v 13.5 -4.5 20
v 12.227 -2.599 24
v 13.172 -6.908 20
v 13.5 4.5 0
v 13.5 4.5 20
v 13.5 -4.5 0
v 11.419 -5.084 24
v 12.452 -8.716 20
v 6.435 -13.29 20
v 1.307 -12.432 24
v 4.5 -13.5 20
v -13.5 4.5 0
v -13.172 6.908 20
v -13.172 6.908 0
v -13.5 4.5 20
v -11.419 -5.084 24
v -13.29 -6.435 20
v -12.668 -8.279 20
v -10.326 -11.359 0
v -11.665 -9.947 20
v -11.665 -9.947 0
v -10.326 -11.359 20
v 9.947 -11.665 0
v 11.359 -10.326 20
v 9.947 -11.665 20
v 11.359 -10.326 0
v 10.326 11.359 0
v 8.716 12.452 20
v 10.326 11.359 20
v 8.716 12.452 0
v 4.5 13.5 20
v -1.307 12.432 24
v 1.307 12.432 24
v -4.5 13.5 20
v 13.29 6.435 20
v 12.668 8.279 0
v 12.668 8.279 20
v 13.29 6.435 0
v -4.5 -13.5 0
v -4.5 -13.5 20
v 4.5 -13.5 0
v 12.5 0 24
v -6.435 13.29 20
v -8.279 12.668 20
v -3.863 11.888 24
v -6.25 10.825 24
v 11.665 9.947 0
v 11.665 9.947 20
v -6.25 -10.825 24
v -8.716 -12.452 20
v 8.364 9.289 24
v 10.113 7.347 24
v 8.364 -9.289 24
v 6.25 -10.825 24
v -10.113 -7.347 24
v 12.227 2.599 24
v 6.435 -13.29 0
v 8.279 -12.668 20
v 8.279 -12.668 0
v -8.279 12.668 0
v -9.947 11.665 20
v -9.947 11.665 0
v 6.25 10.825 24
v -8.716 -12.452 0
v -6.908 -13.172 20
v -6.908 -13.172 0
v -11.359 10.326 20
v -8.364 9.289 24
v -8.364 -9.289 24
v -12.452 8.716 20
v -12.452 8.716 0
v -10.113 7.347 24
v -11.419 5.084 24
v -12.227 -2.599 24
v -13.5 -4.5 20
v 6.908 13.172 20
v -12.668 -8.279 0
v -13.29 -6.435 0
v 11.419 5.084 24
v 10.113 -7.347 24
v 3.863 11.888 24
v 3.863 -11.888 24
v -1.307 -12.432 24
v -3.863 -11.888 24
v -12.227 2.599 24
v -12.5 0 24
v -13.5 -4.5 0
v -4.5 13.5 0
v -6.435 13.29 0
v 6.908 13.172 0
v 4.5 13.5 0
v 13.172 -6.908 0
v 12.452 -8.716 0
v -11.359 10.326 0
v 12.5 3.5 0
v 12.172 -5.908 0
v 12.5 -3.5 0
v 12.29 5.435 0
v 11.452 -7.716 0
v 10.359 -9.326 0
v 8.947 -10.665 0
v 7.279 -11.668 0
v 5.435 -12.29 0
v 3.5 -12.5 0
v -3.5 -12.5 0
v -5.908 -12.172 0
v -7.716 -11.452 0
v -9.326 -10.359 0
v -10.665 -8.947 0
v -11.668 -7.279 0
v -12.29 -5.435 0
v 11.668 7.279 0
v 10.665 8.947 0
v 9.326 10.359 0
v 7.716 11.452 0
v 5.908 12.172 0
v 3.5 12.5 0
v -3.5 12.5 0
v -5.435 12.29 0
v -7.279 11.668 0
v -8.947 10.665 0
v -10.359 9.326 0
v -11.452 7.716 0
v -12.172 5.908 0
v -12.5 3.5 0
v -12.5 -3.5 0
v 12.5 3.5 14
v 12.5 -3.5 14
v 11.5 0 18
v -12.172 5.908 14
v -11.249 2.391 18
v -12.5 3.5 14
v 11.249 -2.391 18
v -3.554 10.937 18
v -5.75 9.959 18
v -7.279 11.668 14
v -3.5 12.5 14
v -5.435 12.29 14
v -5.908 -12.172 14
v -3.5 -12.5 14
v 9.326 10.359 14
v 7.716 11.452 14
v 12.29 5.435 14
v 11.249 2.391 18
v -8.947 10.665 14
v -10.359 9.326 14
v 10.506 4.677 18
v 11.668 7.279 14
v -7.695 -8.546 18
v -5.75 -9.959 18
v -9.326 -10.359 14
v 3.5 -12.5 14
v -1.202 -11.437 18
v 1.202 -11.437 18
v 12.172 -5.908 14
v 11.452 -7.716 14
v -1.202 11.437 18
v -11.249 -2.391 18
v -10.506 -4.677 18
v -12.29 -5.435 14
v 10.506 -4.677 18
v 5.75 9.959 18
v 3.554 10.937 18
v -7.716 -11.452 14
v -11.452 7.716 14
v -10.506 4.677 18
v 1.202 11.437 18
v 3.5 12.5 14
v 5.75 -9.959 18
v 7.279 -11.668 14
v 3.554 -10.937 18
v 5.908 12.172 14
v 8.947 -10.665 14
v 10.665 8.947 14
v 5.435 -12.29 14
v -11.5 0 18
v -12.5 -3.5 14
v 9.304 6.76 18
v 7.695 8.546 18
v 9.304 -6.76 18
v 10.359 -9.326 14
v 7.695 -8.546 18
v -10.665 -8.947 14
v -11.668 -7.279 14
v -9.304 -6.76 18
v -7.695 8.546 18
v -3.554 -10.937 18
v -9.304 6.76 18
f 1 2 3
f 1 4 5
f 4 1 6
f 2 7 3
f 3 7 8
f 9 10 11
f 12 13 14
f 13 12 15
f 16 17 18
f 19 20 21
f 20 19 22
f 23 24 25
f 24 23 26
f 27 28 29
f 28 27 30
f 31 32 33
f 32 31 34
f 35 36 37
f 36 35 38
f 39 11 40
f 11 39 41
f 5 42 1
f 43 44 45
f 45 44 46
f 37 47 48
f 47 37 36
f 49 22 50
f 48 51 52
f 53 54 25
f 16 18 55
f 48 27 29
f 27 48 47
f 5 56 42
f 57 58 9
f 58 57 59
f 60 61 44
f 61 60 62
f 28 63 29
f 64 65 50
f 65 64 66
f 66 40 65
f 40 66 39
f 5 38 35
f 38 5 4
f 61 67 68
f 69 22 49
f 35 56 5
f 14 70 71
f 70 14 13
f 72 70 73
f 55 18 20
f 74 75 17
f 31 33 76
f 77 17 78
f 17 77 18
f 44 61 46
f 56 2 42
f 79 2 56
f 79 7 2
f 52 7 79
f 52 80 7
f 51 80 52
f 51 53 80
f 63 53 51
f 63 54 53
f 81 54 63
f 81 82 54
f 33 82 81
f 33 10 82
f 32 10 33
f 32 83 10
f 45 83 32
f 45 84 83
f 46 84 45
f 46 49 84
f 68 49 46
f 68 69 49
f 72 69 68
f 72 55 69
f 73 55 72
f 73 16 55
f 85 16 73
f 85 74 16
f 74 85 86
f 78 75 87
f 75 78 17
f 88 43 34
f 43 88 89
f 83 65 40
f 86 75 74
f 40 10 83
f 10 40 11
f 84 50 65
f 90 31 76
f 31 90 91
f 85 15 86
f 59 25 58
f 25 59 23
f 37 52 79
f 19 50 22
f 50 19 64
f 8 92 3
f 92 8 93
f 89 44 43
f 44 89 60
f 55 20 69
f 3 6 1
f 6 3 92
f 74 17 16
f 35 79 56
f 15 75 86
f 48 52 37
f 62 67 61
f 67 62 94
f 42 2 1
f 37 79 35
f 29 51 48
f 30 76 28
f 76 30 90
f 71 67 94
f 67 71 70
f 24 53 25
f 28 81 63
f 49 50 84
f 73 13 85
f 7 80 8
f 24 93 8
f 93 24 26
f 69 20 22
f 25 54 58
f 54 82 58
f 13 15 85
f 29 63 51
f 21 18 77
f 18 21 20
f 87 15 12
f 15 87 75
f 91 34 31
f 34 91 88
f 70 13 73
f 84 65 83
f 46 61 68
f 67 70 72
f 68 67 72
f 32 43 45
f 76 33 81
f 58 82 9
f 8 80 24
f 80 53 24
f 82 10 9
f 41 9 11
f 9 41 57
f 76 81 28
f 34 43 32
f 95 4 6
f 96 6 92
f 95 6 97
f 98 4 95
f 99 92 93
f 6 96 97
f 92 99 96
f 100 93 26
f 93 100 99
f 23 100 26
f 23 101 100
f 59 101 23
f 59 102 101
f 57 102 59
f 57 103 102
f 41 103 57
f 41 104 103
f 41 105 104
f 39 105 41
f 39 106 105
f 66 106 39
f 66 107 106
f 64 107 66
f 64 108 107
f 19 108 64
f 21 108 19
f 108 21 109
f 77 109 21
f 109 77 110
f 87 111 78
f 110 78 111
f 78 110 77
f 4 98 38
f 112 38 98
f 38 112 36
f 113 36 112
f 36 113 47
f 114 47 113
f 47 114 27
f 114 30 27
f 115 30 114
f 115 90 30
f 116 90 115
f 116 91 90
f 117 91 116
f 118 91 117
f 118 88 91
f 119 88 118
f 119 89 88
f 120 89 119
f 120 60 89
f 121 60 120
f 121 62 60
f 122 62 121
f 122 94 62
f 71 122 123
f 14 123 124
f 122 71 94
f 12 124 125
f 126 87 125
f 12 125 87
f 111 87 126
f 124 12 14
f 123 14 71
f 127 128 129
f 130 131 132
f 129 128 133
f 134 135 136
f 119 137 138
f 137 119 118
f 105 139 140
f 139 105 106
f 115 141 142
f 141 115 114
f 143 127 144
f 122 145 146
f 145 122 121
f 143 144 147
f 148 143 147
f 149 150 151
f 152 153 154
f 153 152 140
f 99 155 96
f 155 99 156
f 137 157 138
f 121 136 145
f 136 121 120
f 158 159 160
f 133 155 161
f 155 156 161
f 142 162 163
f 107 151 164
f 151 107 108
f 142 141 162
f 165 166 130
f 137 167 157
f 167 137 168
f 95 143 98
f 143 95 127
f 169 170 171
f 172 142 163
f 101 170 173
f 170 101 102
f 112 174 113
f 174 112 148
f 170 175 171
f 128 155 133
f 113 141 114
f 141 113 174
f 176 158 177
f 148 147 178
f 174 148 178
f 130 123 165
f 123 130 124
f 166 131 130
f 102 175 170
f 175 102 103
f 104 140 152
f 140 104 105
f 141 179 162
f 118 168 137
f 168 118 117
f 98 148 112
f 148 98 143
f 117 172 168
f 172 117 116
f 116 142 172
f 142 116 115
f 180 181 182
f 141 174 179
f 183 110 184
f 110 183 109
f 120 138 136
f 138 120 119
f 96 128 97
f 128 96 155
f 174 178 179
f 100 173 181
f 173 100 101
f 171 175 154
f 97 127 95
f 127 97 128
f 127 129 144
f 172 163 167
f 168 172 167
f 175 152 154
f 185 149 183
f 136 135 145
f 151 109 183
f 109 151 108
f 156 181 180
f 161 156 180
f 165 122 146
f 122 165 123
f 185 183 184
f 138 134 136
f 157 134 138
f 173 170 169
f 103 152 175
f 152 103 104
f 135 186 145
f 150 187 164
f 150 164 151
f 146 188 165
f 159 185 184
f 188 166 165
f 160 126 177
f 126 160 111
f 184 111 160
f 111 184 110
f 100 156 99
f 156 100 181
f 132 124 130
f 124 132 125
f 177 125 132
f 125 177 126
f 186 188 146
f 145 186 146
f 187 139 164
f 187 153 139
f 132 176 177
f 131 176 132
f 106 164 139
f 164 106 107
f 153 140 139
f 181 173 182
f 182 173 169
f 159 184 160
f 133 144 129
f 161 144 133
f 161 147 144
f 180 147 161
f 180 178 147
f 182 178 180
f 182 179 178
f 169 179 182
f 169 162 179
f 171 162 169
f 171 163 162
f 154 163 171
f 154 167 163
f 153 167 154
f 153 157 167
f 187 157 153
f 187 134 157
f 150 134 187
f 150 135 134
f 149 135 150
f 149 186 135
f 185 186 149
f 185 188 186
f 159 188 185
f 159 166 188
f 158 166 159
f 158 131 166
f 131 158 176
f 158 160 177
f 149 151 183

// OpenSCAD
//Front part of leg width
legX=25;
//Side oart if leg width
legY=25;
//Foot height
legZ=20;
//Round Bottom diameter
bottomD=28;
//Bottom thickness
bottomthick=6;
//Side Thickness
SideThick=2;

difference(){
FootShape(legX,legY,legZ,bottomD,bottomthick) ;
translate([0,-0,-bottomthick])
FootShape((legX-SideThick),(legY-SideThick),legZ,bottomD,bottomthick) ;
}

module FootShape(legX,legY,legZ,bottomD,bottomthick){
    adjustmentxy=16;
    hull(){
    linear_extrude(height = legZ, twist = 0, slices = 50) {
       difference() {
         offset(r = 9) {
          square([legX-adjustmentxy,legY-adjustmentxy], center = true);
         }
         offset(r = 8) {
           square([legX-adjustmentxy,legY-adjustmentxy], center = true);
         }
       }
     }
     translate([0,-0,18])
     //cylinder(d=bottomD,h=bottomthick);
     OvalCylinder(legX,legY,bottomthick);
     }
    }

 module OvalCylinder(x,y,z){
     translate([0,(-(x-y)/2),0])
//     echo(x,y,x-y)
  //   echo(y)
//     echo(x-y)
     linear_extrude(height = z,  twist = 0, slices = 50) {
    hull() {
        translate([0,x-y,0]) circle(d=x);
        circle(d=x);
    }
     }
 } 
